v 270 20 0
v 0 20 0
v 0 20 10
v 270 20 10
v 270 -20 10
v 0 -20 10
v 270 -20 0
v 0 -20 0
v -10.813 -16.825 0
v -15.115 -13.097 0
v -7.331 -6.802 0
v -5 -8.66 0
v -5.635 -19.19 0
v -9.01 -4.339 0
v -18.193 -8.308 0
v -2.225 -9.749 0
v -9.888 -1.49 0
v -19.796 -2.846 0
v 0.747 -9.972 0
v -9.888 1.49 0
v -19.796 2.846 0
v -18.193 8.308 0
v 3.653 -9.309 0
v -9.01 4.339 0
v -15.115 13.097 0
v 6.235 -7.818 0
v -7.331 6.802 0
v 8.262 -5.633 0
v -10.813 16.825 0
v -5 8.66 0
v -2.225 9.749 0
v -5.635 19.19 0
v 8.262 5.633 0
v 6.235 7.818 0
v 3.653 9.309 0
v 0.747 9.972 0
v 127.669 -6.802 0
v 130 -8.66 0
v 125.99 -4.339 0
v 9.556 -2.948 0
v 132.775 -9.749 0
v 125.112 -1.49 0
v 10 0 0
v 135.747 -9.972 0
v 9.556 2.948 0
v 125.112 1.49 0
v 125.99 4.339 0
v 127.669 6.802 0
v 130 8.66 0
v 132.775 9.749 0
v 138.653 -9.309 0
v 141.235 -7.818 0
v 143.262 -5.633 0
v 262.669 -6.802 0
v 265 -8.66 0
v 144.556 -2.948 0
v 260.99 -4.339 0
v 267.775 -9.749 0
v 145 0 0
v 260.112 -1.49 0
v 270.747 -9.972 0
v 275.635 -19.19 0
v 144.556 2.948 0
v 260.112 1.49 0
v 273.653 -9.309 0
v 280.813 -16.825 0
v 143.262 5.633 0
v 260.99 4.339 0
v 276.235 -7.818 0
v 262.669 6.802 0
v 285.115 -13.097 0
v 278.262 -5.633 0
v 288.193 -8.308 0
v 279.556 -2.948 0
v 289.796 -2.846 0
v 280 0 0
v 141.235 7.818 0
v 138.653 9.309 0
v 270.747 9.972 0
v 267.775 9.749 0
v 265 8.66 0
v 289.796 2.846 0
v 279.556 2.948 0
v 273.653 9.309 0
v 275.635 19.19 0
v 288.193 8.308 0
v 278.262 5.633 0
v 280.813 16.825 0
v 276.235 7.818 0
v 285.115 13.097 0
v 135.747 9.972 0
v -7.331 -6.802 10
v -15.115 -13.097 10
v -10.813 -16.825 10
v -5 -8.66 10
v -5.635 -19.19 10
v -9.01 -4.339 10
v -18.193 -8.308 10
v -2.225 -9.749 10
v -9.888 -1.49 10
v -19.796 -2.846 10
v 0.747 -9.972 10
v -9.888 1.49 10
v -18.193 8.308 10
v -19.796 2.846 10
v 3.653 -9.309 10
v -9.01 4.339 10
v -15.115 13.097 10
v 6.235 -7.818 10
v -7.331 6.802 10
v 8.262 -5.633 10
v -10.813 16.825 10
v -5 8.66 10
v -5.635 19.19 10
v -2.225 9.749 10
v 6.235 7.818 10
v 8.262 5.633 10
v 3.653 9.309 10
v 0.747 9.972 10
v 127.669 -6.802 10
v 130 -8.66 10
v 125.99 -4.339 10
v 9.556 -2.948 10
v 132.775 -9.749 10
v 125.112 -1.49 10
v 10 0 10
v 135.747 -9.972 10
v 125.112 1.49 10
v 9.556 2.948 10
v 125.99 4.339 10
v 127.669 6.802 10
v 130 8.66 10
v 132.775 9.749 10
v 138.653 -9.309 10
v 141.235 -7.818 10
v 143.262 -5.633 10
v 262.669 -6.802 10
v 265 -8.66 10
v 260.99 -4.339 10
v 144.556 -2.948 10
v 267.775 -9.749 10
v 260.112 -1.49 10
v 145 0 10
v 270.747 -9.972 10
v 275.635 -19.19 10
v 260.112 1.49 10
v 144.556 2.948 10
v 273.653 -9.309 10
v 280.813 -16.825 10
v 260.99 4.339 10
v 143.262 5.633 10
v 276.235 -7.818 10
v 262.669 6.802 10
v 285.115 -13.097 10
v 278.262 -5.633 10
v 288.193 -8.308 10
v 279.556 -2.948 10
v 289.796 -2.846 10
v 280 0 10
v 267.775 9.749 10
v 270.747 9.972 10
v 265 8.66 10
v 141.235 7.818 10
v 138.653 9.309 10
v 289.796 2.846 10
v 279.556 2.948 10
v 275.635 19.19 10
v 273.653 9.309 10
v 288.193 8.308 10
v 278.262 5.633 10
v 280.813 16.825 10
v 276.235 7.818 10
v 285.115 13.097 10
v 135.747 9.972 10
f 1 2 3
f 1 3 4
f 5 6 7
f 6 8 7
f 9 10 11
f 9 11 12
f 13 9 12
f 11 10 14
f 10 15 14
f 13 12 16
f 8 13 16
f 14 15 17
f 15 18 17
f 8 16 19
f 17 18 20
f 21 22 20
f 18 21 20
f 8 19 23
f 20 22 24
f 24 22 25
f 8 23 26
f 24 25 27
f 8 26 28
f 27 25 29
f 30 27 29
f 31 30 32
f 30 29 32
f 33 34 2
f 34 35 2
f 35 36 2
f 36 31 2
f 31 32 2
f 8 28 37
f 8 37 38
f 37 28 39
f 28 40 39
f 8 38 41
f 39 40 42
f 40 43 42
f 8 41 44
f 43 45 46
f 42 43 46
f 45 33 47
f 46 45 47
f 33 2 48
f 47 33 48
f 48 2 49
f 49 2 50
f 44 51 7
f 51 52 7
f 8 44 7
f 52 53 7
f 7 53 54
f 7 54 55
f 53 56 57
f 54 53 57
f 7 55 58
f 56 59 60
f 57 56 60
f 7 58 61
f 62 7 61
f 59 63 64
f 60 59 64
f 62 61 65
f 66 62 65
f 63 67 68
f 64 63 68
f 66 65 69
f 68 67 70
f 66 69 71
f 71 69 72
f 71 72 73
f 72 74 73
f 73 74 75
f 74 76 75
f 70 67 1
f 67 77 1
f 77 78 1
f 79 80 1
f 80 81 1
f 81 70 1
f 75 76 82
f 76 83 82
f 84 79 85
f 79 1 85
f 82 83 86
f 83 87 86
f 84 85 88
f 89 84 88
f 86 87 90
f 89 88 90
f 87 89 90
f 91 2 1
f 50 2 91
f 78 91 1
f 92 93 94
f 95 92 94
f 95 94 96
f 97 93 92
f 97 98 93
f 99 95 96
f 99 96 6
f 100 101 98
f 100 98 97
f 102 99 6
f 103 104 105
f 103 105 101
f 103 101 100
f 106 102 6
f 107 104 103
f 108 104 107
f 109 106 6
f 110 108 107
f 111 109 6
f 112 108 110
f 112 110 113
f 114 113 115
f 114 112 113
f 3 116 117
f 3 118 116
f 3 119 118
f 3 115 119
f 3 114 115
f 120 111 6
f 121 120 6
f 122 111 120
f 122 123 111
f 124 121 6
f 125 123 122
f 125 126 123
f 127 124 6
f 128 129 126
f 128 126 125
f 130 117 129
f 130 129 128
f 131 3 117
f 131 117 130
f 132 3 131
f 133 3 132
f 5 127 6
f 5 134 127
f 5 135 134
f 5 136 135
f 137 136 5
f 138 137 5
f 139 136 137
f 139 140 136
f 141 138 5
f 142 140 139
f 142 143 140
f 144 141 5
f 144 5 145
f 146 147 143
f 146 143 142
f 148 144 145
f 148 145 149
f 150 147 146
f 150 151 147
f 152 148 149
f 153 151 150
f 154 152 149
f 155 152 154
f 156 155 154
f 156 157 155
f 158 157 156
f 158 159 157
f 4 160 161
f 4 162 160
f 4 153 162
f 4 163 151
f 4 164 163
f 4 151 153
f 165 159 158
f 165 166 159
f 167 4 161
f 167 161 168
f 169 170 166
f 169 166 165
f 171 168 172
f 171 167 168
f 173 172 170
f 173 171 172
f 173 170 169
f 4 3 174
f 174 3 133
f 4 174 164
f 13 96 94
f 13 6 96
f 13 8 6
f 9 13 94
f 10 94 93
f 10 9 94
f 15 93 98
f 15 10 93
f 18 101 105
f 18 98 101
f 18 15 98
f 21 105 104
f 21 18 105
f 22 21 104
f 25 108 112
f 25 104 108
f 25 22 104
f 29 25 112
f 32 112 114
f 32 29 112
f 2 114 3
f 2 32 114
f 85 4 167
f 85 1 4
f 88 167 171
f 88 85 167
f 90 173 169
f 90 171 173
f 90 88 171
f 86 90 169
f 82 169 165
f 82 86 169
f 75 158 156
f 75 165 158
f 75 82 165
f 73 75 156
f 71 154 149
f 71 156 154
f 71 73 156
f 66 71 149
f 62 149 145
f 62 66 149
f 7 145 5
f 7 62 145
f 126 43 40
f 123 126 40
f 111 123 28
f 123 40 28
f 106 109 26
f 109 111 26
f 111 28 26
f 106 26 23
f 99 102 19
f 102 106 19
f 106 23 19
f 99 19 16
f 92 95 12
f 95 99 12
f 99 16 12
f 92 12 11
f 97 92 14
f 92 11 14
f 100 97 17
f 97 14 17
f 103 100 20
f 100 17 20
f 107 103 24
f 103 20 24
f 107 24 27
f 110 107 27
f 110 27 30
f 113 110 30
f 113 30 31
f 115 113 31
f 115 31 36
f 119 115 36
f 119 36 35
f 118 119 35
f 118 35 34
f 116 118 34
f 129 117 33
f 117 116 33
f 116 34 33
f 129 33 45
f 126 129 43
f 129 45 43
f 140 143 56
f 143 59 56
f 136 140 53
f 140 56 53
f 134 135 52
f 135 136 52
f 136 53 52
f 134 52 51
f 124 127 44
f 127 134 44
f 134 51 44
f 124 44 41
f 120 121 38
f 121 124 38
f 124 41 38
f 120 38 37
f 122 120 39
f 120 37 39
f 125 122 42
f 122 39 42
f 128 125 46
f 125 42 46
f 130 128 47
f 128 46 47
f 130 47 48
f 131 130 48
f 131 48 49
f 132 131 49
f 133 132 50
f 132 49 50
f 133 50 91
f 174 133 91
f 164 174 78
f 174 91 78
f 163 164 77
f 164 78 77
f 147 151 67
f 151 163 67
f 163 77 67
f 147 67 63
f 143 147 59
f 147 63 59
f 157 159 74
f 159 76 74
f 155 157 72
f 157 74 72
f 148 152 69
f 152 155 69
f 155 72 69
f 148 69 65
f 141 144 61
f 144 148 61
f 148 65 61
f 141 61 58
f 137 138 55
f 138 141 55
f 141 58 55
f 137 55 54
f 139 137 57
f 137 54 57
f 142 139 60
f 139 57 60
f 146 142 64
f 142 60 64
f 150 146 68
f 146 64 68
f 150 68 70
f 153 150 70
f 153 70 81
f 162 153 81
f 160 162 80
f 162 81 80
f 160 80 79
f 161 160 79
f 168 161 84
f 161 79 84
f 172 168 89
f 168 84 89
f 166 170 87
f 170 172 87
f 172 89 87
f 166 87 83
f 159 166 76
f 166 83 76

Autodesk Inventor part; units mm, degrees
ref_plane "YZ Plane" through (0, 0, 0) normal (1, 0, 0) x (0, 1, 0)
ref_plane "XZ Plane" through (0, 0, 0) normal (0, 1, 0) x (-1, 0, 0)
sketch "Sketch1" plane through (0, 0, 0) normal (0, 0, 1) x (1, 0, 0)
  line L0 (0, 0) -> (135, 0) construction
  line L1 (135, 0) -> (270, 0) construction
  circle A0 centre (0, 0) radius 10
  circle A1 centre (270, 0) radius 10
  circle A2 centre (0, 0) radius 20
  circle A3 centre (270, 0) radius 20
  line L2 (0, 20) -> (270, 20)
  line L3 (0, -20) -> (270, -20)
  circle A4 centre (135, 0) radius 10
  dimension "d0" = 135
  dimension "d1" = 20
  dimension "d2" = 20
  dimension "d3" = 40
  dimension "d4" = 40
  dimension "d7" = 20
extrude "Extrusion1" add sketch "Sketch1" along normal blind 10
ref_plane "Work Plane1" through (0, 0, 5) normal (0, 0, 1) x (1, 0, 0)
properties part number "EslabonPreliminarElevacion"
